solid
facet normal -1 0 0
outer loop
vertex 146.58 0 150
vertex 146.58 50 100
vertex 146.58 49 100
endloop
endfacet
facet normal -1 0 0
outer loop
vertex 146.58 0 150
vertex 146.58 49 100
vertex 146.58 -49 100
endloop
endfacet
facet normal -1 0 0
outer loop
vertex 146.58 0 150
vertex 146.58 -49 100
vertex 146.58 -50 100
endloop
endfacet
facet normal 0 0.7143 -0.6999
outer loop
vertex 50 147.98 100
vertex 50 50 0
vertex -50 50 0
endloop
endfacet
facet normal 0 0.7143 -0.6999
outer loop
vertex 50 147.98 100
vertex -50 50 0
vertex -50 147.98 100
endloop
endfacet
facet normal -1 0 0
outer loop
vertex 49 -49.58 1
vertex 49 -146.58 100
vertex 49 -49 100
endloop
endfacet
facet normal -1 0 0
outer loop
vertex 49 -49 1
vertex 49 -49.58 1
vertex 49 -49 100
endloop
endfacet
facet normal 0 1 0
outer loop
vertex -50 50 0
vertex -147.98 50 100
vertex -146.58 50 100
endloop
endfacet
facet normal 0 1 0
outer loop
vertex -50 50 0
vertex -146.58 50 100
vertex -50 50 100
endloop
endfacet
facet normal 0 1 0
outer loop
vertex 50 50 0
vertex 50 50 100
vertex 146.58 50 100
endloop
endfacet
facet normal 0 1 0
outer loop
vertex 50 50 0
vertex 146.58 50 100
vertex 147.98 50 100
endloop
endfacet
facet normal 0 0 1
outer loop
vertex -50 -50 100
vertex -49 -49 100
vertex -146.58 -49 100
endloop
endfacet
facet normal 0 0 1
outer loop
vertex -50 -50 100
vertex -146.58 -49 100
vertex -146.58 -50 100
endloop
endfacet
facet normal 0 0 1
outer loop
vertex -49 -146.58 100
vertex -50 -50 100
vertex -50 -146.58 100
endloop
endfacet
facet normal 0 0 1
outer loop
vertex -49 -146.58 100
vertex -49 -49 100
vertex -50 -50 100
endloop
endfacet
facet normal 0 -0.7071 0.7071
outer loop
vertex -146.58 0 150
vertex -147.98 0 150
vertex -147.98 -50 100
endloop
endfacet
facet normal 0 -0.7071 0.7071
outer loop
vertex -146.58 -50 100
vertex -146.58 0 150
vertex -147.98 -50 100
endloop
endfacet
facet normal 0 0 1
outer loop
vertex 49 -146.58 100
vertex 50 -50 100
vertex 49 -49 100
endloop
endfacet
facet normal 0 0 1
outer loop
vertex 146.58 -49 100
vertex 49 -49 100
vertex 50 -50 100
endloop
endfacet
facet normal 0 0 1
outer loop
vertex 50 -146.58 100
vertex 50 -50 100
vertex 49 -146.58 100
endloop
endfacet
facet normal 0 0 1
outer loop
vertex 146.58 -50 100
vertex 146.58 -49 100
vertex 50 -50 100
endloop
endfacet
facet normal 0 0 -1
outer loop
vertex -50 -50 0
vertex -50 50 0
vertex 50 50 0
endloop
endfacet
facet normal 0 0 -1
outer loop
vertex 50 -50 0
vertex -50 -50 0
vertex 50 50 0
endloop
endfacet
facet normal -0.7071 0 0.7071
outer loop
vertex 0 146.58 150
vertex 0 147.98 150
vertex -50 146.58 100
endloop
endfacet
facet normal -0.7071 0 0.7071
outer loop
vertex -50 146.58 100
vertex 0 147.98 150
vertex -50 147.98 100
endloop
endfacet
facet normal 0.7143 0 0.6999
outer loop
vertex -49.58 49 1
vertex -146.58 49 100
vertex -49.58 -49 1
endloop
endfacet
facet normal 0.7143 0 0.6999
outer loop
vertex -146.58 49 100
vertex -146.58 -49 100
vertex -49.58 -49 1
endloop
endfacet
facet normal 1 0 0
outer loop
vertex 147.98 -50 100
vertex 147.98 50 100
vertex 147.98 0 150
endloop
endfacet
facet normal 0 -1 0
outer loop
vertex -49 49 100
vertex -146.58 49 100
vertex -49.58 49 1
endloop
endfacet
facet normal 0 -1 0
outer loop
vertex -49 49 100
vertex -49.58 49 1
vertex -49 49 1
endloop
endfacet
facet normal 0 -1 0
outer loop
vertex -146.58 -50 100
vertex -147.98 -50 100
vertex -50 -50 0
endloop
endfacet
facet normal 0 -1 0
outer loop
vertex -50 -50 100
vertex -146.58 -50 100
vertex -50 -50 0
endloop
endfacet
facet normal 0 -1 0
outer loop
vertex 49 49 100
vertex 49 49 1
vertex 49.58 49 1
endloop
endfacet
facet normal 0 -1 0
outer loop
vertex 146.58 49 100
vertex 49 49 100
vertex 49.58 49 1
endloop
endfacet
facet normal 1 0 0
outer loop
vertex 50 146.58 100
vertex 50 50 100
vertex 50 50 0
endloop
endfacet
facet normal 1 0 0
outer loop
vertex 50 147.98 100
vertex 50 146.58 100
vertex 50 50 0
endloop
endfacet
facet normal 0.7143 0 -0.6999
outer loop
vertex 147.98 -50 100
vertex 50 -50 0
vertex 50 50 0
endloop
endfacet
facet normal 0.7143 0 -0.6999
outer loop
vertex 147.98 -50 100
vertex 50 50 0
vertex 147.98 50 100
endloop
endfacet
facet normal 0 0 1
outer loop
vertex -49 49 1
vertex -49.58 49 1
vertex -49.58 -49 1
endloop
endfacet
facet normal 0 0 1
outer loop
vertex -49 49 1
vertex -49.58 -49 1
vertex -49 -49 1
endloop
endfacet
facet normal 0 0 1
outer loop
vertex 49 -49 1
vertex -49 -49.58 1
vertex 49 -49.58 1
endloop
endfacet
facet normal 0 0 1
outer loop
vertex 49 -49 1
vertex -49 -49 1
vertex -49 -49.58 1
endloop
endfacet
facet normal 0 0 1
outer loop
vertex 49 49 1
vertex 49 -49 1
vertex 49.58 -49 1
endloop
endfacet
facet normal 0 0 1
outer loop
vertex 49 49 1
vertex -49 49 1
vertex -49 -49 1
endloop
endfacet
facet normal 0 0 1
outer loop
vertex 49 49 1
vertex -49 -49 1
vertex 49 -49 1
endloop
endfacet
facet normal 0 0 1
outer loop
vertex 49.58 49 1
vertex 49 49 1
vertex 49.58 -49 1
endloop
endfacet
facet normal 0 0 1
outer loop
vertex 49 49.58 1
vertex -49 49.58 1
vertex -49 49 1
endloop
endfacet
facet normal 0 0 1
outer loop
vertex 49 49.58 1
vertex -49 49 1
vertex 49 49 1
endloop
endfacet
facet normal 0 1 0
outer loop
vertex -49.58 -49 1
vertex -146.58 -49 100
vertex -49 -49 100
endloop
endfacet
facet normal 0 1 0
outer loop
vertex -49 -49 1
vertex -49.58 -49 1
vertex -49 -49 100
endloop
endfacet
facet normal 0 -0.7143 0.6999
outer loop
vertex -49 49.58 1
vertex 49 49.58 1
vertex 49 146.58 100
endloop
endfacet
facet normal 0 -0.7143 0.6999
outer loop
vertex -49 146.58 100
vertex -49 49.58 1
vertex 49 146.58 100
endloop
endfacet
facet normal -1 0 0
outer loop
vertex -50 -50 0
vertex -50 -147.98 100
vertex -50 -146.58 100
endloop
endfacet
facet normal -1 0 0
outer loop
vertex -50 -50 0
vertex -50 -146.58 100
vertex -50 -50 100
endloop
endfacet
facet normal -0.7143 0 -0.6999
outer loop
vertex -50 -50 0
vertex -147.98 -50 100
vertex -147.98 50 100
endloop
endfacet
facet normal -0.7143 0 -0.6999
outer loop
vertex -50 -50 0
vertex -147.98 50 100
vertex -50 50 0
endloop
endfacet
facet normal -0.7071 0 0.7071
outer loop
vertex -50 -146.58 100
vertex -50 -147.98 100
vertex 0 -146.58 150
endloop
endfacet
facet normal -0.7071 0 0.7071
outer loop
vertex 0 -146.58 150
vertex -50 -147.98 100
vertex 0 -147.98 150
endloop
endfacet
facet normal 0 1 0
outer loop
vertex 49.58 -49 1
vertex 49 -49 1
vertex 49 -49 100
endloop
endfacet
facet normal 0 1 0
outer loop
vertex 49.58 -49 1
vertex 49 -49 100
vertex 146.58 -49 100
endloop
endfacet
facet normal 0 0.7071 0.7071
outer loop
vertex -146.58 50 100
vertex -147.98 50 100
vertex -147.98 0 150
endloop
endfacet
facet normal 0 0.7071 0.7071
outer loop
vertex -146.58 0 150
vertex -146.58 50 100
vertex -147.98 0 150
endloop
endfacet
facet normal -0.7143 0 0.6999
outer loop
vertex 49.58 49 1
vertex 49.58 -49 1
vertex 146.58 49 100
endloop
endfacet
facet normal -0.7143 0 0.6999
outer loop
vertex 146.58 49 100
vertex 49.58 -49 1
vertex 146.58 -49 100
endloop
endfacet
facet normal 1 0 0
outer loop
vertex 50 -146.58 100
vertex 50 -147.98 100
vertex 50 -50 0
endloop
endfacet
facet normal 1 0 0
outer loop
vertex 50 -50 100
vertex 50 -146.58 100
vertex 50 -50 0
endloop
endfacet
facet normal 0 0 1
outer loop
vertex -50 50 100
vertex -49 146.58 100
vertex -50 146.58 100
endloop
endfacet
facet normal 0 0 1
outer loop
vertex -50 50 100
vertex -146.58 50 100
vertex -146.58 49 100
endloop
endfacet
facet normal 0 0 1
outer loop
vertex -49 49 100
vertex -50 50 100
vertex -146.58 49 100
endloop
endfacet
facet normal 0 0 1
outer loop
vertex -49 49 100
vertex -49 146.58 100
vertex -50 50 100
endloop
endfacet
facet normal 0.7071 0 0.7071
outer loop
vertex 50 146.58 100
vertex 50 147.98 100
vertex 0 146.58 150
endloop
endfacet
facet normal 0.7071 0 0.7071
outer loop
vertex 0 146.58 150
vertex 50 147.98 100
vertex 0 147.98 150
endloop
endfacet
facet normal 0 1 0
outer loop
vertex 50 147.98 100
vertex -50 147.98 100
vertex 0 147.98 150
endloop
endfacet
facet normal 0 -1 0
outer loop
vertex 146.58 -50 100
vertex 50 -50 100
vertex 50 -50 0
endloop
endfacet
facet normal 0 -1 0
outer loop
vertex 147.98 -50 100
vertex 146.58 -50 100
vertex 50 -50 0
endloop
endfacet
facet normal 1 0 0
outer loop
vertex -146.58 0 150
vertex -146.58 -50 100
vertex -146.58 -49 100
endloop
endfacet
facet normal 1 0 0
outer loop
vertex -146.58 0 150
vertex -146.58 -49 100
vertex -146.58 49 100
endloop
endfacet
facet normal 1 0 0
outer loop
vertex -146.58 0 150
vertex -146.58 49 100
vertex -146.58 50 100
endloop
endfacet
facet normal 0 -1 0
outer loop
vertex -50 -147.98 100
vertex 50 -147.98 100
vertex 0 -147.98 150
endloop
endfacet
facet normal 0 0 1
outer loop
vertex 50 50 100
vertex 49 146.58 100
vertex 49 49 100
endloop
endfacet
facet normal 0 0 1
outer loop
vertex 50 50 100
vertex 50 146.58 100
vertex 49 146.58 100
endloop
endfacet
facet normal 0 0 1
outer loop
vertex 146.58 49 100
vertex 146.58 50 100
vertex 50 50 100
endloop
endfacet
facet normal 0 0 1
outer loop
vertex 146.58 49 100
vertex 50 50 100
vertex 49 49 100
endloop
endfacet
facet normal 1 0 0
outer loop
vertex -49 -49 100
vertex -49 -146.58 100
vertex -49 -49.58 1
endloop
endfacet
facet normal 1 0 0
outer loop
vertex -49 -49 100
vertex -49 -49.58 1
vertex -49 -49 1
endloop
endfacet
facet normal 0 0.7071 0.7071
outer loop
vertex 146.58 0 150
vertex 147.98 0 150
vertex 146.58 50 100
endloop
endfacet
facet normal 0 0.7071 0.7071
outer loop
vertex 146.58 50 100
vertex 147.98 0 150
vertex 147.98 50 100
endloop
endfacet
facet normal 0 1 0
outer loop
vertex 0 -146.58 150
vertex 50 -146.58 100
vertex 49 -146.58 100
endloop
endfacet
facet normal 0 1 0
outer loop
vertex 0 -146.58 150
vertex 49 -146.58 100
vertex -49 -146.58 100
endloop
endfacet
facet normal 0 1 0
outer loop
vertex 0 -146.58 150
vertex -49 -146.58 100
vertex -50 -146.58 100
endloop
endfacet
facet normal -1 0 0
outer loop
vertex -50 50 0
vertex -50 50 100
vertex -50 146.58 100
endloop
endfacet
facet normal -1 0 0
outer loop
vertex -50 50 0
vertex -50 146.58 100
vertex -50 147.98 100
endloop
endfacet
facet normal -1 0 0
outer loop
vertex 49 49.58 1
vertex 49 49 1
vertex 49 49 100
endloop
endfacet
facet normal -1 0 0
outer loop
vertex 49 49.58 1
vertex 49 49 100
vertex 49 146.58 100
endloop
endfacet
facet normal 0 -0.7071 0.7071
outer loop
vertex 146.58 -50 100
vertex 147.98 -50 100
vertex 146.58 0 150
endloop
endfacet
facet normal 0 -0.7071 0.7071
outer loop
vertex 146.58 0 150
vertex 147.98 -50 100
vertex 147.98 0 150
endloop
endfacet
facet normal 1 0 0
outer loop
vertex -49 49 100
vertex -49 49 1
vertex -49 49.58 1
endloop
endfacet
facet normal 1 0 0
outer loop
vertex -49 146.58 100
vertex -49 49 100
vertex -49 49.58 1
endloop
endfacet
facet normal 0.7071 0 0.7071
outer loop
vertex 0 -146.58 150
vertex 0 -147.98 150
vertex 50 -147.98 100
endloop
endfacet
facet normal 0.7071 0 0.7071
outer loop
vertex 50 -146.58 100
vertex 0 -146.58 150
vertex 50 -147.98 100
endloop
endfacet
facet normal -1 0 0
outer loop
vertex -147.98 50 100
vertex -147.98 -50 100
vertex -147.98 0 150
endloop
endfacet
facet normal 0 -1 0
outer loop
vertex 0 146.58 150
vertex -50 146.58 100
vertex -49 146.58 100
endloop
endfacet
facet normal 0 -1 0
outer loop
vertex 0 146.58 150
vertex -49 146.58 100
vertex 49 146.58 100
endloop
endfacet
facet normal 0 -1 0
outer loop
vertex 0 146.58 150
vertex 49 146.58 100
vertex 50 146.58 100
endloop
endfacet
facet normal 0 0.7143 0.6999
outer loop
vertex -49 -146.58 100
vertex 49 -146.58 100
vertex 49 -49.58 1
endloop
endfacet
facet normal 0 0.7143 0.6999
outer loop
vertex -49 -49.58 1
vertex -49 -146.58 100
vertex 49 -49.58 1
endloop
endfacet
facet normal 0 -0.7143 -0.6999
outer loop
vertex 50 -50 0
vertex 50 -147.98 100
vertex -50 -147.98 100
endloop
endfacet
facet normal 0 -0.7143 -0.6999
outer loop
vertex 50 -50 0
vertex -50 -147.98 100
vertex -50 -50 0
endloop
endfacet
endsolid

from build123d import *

# Parameters (mm, degrees)
F0_W      = 100
F0_H      = 100
F1_DEPTH  = 100
F3_DEPTH  = 100
F5_COUNT  = 2
F5_ANGLE  = 90
F6_T      = -1
F7_W      = 1.4
F7_H      = 100
F8_DEPTH  = 100
F10_DEPTH = 2
F11_COUNT = 4


with BuildPart() as f1:
    # F0 (on Top) → F1 (new body)
    with BuildSketch(Plane.XY):
        Rectangle(F0_W, F0_H)
    extrude(amount=F1_DEPTH)

    # F2 (on face) → F3 (join)
    with BuildSketch(Plane.XZ.offset(50)):
        Polygon((-50, 0), (-50, 100), (-147.9795897113, 100), align=None)
        Polygon((147.9795897113, 100), (50, 100), (50, 0), align=None)
    extrude(amount=-F3_DEPTH)

    # F5: F1 ×2 about axis
    f5_axis = Axis((0, 0, 92.5767719746), (0, 0, 1))


with BuildPart() as f1_1:
    add(f1.part)
    for i in range(1, F5_COUNT):
        add(f1.part.rotate(f5_axis, i * F5_ANGLE / (F5_COUNT - 1)))

    # F6
    f6_openings = [f1_1.faces().sort_by_distance(p)[0] for p in [
        (0, 0, 100),
    ]]
    offset(amount=F6_T, openings=f6_openings, kind=Kind.INTERSECTION)

    # F7 (on face) → F8 (join)
    with BuildSketch(Plane.XY.offset(100)):
        with Locations((-147.2795897113, 0)):
            Rectangle(F7_W, F7_H)
    extrude(amount=F8_DEPTH)

    # F9 (on face) → F10 (cut)
    with BuildSketch(Plane(origin=(-147.9795897113, 0, 0), x_dir=(0, -1, 0), z_dir=(-1, 0, 0))):
        Polygon((-50, 200), (-50, 100), (0, 150), (50, 100), (50, 200), align=None)
    extrude(amount=-F10_DEPTH, mode=Mode.SUBTRACT)

    # F11: F1 ×4 about axis
    f11_axis = Axis((0, 0, 92.5767719746), (0, 0, 1))


with BuildPart() as f1_2:
    add(f1_1.part)
    for i in range(1, F11_COUNT):
        add(f1_1.part.rotate(f11_axis, i * 360 / F11_COUNT))


solid = f1_2.part
